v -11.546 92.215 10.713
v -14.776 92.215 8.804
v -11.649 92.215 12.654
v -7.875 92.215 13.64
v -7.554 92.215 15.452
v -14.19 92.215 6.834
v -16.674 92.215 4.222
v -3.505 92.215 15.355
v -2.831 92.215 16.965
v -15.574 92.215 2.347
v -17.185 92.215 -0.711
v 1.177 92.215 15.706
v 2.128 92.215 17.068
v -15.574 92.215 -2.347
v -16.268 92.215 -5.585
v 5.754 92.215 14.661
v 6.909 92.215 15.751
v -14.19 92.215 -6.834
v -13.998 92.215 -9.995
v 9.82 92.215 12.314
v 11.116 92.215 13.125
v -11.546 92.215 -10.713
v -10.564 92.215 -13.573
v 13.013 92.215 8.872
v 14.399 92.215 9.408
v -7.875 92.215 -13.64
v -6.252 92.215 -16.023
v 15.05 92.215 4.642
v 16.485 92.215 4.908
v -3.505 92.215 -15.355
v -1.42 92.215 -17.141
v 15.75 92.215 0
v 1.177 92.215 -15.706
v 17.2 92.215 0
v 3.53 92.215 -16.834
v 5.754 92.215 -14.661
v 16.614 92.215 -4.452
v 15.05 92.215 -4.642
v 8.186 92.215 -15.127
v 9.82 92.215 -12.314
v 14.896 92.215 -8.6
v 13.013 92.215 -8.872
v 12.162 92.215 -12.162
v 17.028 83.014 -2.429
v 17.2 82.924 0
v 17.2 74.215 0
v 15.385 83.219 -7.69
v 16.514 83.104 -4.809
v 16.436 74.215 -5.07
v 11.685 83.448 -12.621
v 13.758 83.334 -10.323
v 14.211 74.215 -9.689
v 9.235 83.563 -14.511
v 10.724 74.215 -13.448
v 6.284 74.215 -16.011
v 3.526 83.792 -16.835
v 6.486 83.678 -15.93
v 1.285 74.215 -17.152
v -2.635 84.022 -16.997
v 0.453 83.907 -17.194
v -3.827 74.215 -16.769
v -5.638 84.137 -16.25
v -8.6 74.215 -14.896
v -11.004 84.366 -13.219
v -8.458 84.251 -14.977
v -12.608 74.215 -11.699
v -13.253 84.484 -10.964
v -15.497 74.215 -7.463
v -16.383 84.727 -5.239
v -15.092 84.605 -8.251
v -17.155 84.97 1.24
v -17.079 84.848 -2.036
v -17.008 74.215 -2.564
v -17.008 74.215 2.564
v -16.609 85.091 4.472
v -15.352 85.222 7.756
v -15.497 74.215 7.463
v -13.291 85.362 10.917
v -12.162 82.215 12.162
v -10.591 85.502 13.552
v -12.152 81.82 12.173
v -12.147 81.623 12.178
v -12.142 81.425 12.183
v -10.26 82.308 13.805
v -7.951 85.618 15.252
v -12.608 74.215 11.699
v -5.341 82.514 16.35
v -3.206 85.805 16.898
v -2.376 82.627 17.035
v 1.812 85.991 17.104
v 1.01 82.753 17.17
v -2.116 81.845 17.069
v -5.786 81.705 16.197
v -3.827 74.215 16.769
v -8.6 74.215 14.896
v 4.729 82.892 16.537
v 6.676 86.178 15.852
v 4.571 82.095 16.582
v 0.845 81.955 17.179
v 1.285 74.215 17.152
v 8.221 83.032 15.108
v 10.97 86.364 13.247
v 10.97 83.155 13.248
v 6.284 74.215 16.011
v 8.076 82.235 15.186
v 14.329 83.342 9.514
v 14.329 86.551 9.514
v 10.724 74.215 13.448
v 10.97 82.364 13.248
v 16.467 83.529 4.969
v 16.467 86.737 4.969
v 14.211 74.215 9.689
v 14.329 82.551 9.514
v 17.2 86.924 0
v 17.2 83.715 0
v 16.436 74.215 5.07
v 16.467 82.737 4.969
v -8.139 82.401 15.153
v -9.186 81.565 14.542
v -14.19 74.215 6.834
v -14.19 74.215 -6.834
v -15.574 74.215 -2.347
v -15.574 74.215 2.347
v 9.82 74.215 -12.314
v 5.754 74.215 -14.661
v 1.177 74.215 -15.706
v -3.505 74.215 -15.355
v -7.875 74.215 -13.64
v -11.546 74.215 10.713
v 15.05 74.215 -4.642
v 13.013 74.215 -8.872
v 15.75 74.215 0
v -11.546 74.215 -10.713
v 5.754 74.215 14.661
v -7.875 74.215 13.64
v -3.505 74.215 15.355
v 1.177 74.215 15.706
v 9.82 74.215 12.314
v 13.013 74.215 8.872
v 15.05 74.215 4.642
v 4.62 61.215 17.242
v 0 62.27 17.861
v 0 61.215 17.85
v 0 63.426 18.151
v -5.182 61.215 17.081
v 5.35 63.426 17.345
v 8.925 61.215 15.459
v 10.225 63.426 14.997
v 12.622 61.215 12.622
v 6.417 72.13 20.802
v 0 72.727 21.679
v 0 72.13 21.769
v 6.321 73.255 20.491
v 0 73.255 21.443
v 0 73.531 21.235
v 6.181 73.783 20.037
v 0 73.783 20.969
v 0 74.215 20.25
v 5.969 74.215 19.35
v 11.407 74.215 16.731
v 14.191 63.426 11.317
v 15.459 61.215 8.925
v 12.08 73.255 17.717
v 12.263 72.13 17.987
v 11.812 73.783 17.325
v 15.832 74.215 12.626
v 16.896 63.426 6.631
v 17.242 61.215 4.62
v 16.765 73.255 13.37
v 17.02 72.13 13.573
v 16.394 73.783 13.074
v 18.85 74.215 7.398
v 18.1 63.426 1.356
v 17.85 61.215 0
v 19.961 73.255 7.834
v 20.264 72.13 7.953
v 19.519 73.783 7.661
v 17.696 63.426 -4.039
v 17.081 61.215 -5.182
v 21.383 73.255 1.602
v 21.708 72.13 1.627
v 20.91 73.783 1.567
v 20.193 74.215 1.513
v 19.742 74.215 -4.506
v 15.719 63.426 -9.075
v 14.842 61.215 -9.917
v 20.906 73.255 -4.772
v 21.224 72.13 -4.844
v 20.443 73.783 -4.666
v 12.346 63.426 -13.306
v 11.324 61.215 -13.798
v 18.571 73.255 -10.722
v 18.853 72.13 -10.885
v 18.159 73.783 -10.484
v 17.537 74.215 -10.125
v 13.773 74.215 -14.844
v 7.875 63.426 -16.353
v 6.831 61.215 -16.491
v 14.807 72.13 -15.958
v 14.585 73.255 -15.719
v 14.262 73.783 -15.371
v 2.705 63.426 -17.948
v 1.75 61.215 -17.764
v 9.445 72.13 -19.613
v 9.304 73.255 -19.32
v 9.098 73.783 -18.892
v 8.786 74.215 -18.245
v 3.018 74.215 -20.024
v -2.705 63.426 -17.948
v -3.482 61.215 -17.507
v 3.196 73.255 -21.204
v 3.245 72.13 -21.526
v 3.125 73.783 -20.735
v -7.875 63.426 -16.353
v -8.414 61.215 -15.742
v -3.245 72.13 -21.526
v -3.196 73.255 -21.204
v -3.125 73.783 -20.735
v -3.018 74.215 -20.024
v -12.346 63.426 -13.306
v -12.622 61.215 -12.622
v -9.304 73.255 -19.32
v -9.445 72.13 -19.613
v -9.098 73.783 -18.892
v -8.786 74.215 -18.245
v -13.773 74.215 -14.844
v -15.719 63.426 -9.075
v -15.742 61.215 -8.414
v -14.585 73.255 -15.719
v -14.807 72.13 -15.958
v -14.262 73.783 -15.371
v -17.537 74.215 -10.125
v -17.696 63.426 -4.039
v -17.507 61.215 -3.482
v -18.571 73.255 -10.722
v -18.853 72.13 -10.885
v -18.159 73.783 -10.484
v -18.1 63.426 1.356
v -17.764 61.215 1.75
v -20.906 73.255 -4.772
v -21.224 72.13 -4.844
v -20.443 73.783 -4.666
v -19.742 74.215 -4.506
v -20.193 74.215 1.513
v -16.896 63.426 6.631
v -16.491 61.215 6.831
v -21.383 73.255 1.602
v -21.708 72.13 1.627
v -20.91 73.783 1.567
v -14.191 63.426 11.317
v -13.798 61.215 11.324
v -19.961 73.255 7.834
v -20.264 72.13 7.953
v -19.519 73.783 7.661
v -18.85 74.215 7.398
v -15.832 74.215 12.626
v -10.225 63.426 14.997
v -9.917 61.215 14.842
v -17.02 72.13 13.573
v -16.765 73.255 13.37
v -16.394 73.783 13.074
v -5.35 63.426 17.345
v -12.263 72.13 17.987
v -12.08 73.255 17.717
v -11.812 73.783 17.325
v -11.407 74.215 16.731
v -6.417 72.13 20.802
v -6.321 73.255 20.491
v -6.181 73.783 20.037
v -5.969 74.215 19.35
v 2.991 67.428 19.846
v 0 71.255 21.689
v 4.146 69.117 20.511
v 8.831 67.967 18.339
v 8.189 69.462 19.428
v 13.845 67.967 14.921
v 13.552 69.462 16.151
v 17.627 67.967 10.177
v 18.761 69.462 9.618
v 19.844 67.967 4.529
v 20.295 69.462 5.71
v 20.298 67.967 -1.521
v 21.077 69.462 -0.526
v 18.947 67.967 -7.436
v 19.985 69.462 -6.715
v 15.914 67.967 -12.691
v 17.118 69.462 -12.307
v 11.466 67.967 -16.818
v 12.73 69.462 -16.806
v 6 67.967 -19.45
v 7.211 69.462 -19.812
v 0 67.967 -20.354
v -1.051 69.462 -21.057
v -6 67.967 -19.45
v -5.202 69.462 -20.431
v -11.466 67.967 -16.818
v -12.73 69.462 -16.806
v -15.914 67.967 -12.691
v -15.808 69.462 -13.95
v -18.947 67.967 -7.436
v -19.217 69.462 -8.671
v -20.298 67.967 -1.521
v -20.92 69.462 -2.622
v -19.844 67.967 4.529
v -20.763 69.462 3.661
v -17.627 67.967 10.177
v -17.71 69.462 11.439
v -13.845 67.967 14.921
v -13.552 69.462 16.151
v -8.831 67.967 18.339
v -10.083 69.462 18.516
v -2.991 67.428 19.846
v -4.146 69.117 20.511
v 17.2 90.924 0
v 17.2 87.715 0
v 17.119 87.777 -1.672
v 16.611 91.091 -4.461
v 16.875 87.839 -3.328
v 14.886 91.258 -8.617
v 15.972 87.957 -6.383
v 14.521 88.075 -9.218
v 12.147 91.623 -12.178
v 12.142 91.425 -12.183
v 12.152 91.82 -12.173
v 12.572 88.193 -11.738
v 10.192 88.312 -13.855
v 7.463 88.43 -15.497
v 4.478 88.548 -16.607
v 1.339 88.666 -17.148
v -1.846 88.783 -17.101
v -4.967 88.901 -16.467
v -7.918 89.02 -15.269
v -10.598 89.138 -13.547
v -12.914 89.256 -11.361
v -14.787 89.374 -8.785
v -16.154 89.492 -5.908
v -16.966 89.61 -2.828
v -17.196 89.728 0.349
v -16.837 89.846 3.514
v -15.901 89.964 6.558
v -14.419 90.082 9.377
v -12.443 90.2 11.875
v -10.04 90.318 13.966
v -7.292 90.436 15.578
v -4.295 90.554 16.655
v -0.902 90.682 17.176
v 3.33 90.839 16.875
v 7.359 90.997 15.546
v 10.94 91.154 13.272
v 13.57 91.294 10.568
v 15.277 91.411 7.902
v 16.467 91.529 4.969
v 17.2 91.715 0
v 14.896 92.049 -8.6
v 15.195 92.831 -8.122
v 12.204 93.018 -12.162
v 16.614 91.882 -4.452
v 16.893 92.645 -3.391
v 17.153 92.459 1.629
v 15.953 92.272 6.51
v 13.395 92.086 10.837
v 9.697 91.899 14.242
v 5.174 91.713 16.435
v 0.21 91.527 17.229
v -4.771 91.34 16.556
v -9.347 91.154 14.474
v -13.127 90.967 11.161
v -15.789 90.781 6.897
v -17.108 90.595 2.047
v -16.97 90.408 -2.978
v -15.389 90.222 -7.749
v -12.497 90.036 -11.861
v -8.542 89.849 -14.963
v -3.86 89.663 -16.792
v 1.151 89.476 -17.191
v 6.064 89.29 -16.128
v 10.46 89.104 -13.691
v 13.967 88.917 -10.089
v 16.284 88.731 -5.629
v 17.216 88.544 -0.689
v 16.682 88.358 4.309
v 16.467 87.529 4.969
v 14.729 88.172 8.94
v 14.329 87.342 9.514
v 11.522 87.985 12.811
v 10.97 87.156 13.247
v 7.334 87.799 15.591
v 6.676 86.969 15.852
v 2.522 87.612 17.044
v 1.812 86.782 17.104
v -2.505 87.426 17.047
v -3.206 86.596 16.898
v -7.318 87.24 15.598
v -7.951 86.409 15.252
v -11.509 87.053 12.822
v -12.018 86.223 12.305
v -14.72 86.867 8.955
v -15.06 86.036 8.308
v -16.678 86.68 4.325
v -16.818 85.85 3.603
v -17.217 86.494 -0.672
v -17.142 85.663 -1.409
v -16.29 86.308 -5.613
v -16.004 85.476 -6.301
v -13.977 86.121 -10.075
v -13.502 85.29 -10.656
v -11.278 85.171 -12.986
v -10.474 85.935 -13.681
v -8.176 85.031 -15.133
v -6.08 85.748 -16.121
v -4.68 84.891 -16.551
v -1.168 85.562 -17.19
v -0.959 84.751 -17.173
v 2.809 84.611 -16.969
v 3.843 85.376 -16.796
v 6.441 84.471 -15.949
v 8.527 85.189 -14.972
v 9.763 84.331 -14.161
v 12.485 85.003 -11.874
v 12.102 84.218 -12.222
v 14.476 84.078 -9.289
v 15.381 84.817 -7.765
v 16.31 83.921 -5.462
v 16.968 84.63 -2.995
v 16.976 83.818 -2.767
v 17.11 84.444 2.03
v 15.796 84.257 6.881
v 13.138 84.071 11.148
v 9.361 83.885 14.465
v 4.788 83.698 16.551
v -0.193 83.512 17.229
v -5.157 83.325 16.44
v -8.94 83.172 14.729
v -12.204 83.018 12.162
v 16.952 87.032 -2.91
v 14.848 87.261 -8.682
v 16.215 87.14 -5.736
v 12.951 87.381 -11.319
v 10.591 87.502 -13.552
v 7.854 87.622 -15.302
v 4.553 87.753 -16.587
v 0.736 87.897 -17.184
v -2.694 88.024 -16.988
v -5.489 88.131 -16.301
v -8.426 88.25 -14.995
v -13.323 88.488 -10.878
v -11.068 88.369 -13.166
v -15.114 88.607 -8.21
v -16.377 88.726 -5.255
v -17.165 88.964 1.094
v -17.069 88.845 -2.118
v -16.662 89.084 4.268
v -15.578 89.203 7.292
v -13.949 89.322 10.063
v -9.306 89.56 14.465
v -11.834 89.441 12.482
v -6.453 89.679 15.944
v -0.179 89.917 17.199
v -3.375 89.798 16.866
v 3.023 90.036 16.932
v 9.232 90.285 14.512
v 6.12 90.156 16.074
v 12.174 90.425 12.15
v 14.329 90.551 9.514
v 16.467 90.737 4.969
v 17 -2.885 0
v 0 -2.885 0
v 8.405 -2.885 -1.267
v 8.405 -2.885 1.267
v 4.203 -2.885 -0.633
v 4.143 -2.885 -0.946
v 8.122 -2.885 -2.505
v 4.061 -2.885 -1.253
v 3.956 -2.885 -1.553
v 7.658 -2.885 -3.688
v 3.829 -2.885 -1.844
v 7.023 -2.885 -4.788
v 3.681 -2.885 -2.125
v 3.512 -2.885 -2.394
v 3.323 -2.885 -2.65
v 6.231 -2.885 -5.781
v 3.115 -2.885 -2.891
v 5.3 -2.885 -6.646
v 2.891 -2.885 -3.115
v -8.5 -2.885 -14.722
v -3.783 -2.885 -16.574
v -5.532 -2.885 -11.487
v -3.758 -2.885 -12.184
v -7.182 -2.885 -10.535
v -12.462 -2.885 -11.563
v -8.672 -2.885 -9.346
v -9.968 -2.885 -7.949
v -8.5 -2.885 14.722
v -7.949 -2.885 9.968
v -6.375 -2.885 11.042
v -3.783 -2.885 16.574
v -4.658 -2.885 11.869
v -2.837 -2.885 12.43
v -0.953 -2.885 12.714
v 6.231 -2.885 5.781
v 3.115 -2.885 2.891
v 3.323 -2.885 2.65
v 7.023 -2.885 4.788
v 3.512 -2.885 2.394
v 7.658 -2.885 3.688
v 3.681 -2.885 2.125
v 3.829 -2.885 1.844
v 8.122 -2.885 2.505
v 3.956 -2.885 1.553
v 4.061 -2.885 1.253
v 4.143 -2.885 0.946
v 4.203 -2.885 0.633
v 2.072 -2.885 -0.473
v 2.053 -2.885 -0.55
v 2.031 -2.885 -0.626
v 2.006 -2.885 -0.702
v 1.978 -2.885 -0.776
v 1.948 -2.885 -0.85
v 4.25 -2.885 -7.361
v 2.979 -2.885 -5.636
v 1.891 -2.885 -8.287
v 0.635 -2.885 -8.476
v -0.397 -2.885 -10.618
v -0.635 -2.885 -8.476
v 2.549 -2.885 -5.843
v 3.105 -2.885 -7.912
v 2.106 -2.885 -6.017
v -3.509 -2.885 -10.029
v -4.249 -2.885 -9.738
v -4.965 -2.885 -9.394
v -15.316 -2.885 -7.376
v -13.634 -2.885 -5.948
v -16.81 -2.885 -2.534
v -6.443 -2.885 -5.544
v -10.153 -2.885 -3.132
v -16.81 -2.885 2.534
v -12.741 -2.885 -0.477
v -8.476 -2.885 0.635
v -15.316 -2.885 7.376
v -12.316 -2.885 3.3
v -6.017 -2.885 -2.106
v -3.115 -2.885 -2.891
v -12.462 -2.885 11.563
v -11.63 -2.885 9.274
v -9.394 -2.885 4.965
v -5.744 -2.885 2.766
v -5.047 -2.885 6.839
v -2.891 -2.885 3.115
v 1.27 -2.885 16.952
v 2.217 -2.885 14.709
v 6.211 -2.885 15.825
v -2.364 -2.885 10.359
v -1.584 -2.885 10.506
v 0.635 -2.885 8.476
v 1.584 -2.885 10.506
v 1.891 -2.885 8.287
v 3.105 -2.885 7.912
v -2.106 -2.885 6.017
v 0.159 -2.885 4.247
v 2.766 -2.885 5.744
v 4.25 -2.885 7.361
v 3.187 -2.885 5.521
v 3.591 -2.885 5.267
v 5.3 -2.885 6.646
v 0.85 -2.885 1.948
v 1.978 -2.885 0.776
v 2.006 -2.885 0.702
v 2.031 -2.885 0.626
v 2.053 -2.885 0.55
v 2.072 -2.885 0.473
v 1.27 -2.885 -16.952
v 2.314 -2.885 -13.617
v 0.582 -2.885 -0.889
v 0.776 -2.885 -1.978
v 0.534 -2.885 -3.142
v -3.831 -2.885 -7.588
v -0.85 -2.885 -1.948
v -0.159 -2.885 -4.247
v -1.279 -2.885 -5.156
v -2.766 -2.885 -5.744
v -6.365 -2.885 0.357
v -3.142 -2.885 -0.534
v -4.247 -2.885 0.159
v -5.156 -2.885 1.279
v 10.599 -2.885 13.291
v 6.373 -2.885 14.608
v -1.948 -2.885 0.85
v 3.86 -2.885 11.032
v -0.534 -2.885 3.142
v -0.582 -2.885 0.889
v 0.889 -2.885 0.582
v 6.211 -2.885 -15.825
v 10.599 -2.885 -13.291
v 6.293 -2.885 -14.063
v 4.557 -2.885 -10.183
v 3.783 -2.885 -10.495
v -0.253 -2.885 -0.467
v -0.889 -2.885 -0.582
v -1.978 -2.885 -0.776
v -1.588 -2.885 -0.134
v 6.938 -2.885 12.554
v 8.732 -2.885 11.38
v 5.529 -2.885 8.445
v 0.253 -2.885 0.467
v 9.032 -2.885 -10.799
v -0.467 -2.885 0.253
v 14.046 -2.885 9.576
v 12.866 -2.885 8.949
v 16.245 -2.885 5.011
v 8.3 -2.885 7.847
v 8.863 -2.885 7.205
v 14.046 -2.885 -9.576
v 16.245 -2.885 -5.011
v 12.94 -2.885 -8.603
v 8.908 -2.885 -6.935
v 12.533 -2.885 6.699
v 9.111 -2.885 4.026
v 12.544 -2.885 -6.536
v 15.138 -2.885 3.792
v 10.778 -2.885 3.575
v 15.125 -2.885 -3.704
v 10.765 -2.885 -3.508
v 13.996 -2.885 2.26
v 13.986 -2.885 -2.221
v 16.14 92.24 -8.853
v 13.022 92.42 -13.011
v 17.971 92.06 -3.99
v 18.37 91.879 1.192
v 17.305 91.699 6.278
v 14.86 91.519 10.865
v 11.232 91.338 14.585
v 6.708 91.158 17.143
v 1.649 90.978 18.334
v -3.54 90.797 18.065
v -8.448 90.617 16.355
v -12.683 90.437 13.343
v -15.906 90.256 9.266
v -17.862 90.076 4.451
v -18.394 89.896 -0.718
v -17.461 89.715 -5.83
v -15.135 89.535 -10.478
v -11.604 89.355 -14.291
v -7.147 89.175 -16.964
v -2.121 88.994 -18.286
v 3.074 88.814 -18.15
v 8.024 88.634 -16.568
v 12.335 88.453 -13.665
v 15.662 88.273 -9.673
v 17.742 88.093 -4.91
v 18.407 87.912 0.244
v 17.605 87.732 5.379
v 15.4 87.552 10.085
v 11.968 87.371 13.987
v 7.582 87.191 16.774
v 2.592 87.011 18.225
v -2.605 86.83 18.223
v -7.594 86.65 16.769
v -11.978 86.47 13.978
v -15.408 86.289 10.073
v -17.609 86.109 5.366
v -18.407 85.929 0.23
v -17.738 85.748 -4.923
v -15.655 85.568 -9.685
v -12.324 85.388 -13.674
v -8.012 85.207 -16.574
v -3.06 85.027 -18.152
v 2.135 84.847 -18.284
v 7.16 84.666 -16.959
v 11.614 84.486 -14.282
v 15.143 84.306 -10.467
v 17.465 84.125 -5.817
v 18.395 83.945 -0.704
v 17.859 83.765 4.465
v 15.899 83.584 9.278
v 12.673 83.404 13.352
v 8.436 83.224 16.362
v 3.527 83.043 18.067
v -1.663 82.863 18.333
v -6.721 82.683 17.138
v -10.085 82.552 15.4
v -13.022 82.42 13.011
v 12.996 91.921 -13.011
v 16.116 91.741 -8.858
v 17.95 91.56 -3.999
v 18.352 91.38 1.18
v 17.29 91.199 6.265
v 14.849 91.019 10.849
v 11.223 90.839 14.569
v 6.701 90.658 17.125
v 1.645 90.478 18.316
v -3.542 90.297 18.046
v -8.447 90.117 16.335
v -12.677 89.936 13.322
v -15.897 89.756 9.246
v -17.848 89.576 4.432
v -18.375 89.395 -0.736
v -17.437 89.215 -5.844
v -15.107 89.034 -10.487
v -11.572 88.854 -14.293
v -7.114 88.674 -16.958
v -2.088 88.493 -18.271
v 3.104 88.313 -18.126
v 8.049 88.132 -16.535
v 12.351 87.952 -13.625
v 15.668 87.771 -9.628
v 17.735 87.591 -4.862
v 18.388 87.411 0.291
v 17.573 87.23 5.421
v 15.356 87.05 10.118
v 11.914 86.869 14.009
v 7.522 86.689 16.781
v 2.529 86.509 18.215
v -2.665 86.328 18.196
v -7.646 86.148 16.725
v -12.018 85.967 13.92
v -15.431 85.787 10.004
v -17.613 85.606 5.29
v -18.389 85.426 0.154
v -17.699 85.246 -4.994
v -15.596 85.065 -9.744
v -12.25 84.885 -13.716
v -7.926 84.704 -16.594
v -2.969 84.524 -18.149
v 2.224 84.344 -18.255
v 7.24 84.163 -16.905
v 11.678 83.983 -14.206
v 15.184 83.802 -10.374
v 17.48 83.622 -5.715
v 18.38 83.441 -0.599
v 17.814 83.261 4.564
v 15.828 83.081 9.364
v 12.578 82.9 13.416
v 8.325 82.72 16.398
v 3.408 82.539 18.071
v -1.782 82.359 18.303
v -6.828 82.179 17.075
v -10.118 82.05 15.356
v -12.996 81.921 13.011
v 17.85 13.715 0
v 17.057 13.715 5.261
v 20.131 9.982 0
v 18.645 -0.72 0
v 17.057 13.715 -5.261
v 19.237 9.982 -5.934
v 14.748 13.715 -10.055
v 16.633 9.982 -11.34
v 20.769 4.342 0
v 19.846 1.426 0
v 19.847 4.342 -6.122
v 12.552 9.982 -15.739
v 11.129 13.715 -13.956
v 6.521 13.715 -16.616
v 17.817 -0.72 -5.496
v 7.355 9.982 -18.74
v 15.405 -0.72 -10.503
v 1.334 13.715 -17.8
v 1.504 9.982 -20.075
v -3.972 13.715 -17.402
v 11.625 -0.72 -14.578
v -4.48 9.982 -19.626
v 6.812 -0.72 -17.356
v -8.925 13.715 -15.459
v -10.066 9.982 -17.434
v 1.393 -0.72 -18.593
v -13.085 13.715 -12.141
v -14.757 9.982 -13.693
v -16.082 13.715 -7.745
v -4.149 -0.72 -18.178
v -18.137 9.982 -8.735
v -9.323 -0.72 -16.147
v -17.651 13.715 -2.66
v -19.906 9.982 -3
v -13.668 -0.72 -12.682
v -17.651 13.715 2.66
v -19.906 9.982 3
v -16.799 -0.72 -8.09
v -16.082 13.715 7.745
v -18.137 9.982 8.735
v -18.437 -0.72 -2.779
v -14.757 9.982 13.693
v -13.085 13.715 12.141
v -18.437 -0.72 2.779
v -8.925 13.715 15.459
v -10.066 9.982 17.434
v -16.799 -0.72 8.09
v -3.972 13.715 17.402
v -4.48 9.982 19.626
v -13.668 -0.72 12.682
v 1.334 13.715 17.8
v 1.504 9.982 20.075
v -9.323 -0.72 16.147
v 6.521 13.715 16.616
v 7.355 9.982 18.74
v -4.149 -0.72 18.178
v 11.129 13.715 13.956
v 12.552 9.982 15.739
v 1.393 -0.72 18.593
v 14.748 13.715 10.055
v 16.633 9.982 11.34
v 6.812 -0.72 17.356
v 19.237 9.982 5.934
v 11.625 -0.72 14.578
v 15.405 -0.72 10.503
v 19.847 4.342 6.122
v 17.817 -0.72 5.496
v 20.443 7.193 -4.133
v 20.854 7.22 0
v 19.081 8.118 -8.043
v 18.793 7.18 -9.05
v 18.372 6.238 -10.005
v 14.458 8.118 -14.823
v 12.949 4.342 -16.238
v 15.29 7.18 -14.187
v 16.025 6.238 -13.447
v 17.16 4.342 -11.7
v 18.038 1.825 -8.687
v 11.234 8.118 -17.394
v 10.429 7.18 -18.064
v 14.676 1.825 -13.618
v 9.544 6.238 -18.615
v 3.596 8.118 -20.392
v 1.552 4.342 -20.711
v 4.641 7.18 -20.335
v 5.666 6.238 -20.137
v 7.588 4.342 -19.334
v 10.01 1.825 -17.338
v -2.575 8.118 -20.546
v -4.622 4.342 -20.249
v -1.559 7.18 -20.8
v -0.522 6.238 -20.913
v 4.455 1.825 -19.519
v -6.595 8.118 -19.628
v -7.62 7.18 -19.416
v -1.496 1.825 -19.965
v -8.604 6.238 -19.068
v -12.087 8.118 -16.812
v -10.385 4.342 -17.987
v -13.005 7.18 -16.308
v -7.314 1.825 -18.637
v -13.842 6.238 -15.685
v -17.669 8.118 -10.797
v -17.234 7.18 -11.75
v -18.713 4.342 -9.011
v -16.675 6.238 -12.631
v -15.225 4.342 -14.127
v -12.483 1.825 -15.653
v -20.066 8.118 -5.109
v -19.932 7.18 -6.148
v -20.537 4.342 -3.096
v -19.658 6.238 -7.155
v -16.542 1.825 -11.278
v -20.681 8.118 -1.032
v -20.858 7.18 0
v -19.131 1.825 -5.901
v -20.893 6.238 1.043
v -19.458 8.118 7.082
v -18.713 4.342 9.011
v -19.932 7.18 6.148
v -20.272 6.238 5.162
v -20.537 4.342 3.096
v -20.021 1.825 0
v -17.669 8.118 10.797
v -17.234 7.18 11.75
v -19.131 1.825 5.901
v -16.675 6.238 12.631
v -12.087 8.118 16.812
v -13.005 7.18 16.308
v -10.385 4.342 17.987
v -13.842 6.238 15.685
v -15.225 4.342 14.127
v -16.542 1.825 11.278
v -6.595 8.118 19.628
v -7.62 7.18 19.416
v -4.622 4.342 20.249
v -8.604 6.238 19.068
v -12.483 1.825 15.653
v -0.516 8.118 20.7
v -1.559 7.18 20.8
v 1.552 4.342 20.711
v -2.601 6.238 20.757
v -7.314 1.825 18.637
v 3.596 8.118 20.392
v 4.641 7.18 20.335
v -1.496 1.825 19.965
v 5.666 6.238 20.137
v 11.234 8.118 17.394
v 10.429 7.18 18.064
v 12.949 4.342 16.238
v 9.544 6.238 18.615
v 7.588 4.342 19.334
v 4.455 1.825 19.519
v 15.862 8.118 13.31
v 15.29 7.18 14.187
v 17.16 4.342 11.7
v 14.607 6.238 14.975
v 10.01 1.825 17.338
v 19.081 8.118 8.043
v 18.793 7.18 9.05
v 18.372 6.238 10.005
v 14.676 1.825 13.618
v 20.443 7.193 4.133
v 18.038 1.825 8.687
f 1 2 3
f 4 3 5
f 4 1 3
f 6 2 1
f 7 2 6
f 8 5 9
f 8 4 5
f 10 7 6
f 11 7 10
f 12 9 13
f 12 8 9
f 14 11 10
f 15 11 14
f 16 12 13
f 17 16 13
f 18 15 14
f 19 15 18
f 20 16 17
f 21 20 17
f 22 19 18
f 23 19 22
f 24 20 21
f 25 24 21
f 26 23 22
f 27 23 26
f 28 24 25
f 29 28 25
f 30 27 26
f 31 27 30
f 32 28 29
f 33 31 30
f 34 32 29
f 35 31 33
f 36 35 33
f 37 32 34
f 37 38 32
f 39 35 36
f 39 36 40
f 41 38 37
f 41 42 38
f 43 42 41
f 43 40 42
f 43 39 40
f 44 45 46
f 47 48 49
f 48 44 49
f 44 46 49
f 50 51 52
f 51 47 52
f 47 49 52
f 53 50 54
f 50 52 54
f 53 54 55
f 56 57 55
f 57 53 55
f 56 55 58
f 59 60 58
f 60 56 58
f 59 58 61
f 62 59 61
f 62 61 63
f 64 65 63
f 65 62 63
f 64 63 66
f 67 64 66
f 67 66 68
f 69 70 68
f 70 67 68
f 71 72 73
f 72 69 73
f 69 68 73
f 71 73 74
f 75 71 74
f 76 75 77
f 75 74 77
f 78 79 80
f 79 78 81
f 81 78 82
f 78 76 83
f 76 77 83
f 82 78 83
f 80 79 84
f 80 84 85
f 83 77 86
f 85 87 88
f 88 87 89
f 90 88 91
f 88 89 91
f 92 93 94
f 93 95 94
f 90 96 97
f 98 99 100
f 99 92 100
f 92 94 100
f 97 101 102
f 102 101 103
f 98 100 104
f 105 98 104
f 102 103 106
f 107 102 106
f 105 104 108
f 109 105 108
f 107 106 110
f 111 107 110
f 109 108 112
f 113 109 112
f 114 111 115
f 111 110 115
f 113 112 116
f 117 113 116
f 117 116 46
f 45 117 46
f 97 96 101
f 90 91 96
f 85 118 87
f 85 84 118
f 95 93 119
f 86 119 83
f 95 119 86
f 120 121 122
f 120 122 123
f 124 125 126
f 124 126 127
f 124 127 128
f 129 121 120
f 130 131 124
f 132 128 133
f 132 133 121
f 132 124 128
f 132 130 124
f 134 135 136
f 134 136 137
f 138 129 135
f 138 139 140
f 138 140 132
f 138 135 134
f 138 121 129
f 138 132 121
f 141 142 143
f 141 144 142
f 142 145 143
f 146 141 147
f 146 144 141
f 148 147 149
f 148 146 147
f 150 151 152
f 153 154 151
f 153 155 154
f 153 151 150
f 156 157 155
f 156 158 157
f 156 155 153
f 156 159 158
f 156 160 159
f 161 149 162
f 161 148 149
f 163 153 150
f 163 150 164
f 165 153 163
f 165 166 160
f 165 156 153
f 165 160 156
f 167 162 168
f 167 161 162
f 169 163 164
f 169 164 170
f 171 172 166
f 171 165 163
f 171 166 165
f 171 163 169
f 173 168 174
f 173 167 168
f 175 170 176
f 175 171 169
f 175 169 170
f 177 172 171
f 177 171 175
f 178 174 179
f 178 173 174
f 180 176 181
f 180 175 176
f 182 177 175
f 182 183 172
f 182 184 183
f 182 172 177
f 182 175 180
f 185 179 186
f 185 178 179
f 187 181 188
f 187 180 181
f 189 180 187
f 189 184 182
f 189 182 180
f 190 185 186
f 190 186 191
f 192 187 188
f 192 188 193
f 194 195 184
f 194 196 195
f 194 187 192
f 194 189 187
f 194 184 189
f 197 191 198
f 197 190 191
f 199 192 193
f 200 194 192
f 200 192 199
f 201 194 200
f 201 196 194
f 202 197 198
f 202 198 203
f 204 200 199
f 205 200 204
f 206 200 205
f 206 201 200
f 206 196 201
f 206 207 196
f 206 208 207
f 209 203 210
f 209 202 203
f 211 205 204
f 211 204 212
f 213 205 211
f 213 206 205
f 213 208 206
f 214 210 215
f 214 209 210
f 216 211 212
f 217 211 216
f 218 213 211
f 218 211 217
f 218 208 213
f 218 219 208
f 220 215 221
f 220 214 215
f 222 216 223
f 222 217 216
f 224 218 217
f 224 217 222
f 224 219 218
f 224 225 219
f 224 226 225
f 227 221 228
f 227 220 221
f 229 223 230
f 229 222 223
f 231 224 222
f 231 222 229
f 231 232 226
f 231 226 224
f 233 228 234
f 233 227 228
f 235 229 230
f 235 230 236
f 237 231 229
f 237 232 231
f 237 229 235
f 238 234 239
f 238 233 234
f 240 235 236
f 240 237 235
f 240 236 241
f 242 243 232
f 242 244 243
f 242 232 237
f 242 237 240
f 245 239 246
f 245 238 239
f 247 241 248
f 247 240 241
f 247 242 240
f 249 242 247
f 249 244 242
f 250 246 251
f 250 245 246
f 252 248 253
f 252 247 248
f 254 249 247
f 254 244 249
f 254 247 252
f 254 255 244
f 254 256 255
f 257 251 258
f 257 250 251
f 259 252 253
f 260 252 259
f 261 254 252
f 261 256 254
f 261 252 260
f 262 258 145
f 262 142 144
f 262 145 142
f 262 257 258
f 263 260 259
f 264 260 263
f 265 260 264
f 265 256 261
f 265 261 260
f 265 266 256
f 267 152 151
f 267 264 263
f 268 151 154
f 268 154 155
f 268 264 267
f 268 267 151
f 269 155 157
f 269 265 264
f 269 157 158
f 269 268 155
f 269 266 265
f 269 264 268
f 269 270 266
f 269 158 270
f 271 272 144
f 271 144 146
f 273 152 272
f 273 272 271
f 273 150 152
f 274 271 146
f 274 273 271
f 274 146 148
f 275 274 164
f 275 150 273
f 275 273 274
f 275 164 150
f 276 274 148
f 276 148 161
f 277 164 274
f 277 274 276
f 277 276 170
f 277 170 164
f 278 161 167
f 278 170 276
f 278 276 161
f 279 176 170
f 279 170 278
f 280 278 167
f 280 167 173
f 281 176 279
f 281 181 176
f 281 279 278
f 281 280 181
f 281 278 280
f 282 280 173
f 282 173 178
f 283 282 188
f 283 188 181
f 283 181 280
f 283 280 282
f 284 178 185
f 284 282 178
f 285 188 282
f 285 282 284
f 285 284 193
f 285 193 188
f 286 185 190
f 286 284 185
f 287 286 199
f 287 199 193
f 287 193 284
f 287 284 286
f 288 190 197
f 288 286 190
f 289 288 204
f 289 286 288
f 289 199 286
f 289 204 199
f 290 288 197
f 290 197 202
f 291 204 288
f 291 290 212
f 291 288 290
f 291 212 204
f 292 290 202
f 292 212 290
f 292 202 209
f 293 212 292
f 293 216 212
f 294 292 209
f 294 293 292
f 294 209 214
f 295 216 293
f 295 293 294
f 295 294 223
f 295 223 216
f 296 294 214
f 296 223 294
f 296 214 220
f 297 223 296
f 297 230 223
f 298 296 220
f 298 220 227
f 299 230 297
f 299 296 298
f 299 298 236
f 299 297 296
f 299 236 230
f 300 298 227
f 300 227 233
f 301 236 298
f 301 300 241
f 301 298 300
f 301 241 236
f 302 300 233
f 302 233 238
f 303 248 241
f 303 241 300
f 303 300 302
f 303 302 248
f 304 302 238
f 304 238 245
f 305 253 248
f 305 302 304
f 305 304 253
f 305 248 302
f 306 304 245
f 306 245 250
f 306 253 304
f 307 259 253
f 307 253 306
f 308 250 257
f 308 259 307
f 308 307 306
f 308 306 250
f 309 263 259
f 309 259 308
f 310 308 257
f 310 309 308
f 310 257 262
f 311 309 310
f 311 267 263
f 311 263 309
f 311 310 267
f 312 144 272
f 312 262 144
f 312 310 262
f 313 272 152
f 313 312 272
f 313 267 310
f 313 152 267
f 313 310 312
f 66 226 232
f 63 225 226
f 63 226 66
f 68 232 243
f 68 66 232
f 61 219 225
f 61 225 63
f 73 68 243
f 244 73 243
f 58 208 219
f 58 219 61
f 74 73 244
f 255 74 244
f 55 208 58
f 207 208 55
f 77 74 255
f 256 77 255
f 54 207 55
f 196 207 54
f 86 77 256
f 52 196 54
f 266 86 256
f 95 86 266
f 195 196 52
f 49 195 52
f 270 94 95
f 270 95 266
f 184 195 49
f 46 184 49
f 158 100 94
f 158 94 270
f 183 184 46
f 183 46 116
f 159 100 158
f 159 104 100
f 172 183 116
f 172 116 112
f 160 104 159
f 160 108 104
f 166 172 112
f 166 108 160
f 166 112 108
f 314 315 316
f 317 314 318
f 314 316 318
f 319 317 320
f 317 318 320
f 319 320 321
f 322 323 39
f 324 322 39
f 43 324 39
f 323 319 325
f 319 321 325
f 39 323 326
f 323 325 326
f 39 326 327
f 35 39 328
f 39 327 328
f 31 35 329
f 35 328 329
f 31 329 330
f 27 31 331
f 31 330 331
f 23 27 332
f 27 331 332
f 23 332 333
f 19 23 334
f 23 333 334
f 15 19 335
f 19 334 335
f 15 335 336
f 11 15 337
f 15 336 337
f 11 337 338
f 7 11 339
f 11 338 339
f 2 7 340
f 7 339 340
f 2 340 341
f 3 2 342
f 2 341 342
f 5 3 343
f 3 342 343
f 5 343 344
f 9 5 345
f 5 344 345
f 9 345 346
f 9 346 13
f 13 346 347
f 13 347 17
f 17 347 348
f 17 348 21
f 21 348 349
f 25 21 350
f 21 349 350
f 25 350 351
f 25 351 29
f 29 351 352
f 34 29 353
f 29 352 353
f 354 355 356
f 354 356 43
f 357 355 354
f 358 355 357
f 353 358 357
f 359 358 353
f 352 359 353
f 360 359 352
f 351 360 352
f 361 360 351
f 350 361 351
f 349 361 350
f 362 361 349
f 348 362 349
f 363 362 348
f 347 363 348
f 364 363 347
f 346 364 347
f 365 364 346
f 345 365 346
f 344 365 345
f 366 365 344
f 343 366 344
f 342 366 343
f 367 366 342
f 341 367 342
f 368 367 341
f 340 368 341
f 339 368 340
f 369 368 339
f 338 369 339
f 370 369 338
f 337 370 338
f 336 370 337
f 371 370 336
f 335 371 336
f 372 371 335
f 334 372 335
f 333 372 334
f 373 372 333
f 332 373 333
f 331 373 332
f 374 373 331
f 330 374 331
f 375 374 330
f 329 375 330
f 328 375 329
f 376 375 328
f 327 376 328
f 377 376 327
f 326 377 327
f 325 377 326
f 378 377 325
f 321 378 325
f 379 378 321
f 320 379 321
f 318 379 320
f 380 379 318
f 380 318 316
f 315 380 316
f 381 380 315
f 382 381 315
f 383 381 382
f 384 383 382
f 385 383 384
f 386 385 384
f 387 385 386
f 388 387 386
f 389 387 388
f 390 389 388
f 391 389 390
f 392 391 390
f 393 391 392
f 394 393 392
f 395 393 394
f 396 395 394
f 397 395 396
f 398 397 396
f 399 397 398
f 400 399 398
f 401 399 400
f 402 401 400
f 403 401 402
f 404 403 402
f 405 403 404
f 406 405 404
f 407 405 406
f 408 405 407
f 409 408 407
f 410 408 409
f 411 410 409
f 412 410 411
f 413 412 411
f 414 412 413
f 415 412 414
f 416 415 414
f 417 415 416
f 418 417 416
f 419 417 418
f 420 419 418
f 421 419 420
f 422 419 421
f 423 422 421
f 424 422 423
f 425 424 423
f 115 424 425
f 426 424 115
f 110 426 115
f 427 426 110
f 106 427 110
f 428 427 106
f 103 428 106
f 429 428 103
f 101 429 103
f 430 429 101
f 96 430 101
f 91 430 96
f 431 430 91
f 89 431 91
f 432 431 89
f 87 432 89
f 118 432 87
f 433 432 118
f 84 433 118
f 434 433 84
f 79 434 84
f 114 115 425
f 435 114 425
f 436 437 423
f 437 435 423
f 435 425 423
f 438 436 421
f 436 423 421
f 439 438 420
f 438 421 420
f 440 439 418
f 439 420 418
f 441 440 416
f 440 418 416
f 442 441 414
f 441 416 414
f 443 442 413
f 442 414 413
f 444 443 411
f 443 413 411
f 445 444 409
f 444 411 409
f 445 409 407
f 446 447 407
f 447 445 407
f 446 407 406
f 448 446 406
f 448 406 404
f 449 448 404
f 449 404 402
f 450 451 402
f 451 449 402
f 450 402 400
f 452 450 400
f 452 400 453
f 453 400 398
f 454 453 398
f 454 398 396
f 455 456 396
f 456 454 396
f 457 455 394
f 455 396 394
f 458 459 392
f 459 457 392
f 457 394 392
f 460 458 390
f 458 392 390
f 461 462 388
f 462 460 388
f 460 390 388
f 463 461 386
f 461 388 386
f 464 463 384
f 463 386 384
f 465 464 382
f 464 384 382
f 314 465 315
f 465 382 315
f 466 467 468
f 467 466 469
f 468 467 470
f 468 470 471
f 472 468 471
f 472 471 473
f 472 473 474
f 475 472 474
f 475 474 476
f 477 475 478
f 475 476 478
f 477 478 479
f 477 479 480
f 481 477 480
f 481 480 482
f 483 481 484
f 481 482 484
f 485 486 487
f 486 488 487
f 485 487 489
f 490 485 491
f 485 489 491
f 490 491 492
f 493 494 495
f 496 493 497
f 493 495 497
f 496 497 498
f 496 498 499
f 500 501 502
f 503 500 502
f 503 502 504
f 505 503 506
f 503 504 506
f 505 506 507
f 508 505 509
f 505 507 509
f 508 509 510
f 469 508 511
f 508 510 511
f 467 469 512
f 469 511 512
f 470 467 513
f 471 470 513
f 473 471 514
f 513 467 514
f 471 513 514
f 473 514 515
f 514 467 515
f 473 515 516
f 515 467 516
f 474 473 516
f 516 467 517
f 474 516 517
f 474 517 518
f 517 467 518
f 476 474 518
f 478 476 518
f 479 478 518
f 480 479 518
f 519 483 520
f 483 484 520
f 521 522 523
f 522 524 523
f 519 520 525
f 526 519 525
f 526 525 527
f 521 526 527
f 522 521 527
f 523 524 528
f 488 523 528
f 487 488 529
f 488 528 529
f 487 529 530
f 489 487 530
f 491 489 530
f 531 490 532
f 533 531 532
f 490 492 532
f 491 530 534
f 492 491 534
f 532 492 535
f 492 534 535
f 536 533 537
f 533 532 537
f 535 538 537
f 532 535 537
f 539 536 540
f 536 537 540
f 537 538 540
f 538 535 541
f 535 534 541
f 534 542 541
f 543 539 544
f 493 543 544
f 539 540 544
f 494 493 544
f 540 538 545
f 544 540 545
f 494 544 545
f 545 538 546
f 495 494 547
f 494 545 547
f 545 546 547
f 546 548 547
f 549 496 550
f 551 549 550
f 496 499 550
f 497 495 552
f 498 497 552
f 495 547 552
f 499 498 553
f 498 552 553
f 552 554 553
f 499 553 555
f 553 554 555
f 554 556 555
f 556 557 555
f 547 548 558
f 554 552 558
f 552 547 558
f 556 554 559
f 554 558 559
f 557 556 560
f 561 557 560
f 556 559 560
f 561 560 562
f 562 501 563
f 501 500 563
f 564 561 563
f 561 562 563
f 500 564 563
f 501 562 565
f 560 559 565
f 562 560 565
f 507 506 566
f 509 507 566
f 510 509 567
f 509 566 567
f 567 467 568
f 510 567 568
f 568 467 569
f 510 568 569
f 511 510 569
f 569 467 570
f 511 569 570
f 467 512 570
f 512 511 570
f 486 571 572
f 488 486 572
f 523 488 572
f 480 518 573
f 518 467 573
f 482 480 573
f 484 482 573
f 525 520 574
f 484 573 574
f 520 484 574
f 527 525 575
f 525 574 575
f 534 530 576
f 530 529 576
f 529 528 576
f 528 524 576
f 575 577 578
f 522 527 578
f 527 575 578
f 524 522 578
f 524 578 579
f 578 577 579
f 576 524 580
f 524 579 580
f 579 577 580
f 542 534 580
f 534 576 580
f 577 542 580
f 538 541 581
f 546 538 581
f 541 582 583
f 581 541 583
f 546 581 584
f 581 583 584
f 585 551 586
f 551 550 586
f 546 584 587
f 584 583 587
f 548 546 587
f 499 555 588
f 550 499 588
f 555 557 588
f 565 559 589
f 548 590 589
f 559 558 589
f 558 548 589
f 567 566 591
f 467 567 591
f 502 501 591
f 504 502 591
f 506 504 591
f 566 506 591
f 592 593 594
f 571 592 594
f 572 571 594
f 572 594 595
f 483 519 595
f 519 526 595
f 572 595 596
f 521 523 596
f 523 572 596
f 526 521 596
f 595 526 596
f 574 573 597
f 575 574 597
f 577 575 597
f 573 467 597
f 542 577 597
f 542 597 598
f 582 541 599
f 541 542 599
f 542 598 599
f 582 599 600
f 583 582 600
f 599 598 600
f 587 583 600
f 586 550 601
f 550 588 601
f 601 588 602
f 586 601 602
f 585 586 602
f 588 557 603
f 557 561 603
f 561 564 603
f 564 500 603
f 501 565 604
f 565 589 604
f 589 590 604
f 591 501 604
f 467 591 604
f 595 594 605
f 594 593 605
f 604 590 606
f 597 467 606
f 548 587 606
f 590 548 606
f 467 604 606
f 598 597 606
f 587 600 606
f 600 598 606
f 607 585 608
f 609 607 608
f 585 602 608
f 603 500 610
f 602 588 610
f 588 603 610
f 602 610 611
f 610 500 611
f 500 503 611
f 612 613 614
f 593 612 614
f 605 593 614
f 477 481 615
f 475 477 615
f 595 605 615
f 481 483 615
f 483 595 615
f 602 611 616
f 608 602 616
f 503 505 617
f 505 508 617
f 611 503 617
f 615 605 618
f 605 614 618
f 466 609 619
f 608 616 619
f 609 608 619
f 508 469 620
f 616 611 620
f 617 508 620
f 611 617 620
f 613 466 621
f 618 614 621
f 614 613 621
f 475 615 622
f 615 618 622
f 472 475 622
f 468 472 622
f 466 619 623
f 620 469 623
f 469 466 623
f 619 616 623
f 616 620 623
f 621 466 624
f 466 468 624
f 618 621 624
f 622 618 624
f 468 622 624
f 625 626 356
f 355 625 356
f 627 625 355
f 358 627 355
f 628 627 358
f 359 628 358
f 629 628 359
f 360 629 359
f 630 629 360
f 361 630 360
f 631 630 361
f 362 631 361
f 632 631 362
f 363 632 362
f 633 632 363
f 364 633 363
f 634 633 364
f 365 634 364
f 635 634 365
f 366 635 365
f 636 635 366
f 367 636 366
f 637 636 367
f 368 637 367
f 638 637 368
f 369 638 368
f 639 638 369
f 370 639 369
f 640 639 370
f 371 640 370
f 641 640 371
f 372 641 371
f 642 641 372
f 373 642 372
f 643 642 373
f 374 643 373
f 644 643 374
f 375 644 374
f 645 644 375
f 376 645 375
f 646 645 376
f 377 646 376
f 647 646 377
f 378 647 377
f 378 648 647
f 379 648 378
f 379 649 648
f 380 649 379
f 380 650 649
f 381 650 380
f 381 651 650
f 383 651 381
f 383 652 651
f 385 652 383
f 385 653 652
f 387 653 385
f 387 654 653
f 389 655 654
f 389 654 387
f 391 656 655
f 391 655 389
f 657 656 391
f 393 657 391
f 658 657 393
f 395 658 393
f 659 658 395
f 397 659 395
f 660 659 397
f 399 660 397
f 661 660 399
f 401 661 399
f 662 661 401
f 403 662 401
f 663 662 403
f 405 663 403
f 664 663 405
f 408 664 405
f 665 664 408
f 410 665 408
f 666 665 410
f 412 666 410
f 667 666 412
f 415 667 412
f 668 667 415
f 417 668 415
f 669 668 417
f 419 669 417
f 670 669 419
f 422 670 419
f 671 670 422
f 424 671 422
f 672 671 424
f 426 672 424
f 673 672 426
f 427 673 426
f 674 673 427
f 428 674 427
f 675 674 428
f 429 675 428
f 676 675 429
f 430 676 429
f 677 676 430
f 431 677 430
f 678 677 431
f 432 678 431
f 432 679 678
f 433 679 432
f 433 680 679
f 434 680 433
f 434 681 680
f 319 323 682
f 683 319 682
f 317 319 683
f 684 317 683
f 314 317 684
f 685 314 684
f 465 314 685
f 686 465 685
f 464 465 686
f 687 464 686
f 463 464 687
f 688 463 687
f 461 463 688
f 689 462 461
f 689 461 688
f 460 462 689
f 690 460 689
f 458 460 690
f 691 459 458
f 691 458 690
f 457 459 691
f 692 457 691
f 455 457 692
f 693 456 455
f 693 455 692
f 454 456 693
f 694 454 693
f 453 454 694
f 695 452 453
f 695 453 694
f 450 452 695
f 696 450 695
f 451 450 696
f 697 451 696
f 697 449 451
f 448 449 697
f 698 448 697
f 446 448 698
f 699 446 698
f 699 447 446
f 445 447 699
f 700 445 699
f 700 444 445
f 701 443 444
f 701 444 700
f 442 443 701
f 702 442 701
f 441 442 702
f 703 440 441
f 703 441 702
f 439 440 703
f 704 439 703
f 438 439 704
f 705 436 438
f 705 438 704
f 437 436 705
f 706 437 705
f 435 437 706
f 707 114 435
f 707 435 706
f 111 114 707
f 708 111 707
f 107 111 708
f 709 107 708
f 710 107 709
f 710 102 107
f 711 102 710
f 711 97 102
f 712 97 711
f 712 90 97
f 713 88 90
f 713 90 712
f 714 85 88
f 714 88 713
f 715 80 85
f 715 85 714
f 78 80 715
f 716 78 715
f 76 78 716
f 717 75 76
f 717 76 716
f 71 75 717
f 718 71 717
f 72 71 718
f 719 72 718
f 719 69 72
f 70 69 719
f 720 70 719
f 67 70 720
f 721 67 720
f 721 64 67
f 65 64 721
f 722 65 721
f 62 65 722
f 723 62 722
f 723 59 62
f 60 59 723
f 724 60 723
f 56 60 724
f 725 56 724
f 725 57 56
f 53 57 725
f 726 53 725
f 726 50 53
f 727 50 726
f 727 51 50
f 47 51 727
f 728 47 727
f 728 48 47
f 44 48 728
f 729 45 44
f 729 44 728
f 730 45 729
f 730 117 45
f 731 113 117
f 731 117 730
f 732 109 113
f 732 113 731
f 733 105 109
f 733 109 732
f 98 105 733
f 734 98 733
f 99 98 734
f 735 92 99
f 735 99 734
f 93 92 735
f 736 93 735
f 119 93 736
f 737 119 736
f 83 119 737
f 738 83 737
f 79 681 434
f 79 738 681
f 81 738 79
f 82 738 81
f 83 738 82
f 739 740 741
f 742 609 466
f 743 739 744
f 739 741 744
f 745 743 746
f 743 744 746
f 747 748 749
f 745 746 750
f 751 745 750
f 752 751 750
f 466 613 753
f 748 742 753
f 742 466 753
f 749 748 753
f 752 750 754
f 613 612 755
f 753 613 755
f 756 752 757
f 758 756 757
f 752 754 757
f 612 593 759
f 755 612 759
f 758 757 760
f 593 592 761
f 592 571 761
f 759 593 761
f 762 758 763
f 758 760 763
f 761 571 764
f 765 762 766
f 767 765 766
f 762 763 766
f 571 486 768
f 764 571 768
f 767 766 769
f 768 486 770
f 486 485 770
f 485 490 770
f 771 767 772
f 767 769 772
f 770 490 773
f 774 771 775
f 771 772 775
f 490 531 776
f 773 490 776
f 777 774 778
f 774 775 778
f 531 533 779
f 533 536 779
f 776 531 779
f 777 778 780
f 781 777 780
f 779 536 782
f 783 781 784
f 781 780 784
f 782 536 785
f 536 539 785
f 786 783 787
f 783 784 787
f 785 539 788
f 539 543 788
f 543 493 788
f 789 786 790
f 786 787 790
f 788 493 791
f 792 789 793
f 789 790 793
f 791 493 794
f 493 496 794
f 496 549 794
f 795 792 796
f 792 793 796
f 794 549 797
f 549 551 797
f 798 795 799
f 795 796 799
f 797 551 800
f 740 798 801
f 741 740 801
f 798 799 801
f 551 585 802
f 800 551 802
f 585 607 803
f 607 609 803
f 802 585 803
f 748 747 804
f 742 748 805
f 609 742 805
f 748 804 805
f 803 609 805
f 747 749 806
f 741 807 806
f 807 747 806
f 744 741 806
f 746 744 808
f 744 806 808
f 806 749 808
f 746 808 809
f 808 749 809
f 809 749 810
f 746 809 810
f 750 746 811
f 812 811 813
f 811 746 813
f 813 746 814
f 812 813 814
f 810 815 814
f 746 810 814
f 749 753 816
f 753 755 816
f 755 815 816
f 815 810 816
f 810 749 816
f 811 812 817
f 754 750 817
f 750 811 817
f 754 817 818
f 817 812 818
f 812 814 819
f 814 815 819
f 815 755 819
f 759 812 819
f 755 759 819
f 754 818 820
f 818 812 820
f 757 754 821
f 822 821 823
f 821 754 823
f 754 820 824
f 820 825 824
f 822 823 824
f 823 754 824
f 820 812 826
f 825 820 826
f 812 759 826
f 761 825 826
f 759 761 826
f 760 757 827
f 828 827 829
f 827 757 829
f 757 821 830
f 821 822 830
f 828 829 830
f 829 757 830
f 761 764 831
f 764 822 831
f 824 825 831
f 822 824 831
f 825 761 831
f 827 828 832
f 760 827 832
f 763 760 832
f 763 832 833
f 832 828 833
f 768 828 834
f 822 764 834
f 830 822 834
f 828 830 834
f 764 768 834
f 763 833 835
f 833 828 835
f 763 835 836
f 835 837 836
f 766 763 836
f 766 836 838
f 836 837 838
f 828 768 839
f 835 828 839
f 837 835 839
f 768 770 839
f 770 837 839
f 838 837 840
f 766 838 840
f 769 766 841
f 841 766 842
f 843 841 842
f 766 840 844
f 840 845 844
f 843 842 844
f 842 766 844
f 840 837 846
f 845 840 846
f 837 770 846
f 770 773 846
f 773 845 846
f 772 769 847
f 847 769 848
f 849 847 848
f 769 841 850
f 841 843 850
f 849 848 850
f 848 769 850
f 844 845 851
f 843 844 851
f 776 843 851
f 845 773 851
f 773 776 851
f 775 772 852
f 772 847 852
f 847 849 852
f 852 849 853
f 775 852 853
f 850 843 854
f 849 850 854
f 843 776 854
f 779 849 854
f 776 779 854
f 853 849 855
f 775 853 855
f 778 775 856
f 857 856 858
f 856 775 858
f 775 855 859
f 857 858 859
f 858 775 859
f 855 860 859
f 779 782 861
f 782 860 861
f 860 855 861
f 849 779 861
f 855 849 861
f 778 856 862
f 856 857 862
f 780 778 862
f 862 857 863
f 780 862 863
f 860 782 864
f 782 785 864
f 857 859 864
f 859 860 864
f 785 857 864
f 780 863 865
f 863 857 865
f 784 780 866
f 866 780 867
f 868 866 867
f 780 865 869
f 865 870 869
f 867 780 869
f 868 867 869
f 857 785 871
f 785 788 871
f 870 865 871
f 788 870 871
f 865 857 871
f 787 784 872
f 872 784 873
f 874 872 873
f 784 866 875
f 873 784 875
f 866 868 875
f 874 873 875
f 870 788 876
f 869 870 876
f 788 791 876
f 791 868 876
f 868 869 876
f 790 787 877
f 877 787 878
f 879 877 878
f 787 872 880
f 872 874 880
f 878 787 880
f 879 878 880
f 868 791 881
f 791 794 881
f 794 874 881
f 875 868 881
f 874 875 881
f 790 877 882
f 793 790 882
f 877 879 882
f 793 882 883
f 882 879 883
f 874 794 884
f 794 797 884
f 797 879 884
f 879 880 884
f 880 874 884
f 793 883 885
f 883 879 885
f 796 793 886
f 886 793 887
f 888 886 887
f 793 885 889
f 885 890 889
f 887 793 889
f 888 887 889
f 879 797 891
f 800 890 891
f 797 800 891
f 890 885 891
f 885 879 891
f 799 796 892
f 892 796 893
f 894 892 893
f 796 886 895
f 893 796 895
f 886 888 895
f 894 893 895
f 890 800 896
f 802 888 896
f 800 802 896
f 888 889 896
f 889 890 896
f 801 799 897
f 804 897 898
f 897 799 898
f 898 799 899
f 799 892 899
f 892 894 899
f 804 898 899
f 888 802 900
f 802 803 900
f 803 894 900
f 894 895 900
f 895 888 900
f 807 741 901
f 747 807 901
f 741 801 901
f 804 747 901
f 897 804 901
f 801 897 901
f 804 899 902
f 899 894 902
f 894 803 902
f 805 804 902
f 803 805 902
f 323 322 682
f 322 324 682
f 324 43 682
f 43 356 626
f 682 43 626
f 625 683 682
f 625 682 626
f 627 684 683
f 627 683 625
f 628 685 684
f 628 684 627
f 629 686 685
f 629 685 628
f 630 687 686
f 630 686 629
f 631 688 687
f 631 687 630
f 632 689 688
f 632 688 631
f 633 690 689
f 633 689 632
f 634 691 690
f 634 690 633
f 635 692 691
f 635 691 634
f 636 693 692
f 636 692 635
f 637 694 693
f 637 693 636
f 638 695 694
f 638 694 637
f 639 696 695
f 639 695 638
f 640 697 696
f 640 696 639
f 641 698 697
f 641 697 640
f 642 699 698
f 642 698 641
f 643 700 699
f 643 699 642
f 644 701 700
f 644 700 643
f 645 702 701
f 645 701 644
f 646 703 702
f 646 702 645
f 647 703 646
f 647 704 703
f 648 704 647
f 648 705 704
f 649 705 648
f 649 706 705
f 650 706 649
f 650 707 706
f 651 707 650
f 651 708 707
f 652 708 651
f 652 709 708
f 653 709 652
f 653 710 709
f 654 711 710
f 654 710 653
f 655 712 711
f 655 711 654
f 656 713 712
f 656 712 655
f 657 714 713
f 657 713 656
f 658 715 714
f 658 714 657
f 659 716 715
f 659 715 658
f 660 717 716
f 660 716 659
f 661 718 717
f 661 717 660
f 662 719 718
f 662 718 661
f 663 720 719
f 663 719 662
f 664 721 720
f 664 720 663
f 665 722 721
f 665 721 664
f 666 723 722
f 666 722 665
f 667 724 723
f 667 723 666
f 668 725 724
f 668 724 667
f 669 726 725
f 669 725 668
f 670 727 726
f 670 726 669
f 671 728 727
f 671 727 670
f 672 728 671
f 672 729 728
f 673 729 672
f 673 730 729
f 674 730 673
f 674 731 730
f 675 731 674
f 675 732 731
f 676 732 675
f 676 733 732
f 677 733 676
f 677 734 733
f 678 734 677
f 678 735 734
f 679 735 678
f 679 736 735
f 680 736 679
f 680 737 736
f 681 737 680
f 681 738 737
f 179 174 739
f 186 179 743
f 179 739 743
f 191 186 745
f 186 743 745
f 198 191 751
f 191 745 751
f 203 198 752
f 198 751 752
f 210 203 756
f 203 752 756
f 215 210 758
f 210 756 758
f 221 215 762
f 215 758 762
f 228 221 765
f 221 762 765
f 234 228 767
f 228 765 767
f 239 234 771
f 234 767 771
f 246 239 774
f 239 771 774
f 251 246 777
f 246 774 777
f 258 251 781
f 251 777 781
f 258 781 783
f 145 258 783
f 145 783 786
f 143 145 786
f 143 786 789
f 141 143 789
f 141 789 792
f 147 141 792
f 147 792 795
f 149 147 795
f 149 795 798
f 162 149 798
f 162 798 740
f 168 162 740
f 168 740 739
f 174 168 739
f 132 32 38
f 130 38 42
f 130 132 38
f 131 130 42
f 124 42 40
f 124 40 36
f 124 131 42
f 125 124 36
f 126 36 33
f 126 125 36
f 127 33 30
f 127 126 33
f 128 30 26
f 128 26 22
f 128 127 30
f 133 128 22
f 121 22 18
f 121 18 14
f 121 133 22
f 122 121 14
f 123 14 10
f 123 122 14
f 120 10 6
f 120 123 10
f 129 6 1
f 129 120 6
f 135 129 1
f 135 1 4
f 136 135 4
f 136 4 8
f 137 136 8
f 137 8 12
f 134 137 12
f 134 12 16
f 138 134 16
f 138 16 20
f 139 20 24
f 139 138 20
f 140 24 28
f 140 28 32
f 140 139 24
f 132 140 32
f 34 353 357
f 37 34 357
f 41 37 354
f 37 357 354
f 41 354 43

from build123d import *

# Parameters (mm, degrees)
SKETCH_3_R          = 17.85
EXTRUDE_1_DEPTH     = 47.5
SKETCH_5_R          = 17.2
SKETCH_5_R_2        = 15.75
EXTRUDE_2_DEPTH     = 18
SWEEP_6_PITCH       = 4
SWEEP_6_HEIGHT      = 10
SWEEP_6_RADIUS      = 17.2
SWEEP_6_START_ANGLE = 45


with BuildPart() as part:
    # По траектории5: sweep along a path in Эскиз1
    with BuildLine(Plane(origin=(0, 0, 0), x_dir=(1, 0, 0), z_dir=(0, 1, 0))) as sweep_5_path:
        CenterArc((0, 0), 20.25, 0, 360)
    # Эскиз2 → По траектории5 (sweep)
    with BuildSketch(Plane(origin=(0, 0, 20.25), x_dir=(0, 0, -1), z_dir=(1, 0, 0))):
        with BuildLine():
            Line((20.25, -2.884804654), (20.25, 13.715195346))
            Line((20.25, 13.715195346), (2.4, 13.715195346))
            add(Edge.make_bspline(
                [(3.25, -2.884804654), (-4.140339113, 5.721368346), (2.4, 13.715195346)],
                knots=[0, 0, 0, 1, 1, 1], degree=2))
            Line((3.25, -2.884804654), (20.25, -2.884804654))
        make_face()
    sweep(path=sweep_5_path.line)

    # Эскиз3 → Бобышка-Вытянуть1 (add)
    with BuildSketch(Plane(origin=(0, 13.715195346, 0), x_dir=(1, 0, 0), z_dir=(0, 1, 0))):
        Circle(SKETCH_3_R)
    extrude(amount=EXTRUDE_1_DEPTH)

    # Эскиз4 → Повернуть1 (revolve)
    with BuildSketch(Plane(origin=(0, 0, 20.25), x_dir=(0, 0, -1), z_dir=(1, 0, 0))):
        with BuildLine():
            add(Edge.make_bspline(
                [(2.4, 61.215195346), (3.008061282, 65.151641805), (-4.686382265, 72.118473987), (0, 74.215195346)],
                knots=[0, 0, 0, 0, 1, 1, 1, 1], degree=3))
            Line((0, 74.215195346), (20.25, 74.215195346))
            Line((20.25, 74.215195346), (20.25, 61.215195346))
            Line((20.25, 61.215195346), (2.4, 61.215195346))
        make_face()
    revolve(axis=Axis((0, 61.215195346, 0), (0, 1, 0)))

    # Эскиз5 → Бобышка-Вытянуть2 (add)
    with BuildSketch(Plane(origin=(0, 74.215195346, 0), x_dir=(1, 0, 0), z_dir=(0, 1, 0))):
        Circle(SKETCH_5_R)
        Circle(SKETCH_5_R_2, mode=Mode.SUBTRACT)
    extrude(amount=EXTRUDE_2_DEPTH)

    # По траектории6: sweep along a helix
    with BuildLine() as sweep_6_path:
        add(Helix(SWEEP_6_PITCH, SWEEP_6_HEIGHT, SWEEP_6_RADIUS, center=(0, 92.215195346, 0), direction=(0, -1, 0), mode=Mode.PRIVATE).rotate(Axis((0, 92.215195346, 0), (0, -1, 0)), SWEEP_6_START_ANGLE))
    # Эскиз9 → По траектории6 (sweep)
    with BuildSketch(Plane(origin=(12.162236636, 92.215195346, -12.162236636), x_dir=(0.705651254, -0.037044276, -0.707590298), z_dir=(0.706622929, -0.036987451, 0.706622929))):
        Polygon((0, 0.803706964), (0, -0.803706964), (1.2, -0.25), (1.2, 0.25), align=None)
    sweep(path=sweep_6_path.line, is_frenet=True)


solid = part.part
